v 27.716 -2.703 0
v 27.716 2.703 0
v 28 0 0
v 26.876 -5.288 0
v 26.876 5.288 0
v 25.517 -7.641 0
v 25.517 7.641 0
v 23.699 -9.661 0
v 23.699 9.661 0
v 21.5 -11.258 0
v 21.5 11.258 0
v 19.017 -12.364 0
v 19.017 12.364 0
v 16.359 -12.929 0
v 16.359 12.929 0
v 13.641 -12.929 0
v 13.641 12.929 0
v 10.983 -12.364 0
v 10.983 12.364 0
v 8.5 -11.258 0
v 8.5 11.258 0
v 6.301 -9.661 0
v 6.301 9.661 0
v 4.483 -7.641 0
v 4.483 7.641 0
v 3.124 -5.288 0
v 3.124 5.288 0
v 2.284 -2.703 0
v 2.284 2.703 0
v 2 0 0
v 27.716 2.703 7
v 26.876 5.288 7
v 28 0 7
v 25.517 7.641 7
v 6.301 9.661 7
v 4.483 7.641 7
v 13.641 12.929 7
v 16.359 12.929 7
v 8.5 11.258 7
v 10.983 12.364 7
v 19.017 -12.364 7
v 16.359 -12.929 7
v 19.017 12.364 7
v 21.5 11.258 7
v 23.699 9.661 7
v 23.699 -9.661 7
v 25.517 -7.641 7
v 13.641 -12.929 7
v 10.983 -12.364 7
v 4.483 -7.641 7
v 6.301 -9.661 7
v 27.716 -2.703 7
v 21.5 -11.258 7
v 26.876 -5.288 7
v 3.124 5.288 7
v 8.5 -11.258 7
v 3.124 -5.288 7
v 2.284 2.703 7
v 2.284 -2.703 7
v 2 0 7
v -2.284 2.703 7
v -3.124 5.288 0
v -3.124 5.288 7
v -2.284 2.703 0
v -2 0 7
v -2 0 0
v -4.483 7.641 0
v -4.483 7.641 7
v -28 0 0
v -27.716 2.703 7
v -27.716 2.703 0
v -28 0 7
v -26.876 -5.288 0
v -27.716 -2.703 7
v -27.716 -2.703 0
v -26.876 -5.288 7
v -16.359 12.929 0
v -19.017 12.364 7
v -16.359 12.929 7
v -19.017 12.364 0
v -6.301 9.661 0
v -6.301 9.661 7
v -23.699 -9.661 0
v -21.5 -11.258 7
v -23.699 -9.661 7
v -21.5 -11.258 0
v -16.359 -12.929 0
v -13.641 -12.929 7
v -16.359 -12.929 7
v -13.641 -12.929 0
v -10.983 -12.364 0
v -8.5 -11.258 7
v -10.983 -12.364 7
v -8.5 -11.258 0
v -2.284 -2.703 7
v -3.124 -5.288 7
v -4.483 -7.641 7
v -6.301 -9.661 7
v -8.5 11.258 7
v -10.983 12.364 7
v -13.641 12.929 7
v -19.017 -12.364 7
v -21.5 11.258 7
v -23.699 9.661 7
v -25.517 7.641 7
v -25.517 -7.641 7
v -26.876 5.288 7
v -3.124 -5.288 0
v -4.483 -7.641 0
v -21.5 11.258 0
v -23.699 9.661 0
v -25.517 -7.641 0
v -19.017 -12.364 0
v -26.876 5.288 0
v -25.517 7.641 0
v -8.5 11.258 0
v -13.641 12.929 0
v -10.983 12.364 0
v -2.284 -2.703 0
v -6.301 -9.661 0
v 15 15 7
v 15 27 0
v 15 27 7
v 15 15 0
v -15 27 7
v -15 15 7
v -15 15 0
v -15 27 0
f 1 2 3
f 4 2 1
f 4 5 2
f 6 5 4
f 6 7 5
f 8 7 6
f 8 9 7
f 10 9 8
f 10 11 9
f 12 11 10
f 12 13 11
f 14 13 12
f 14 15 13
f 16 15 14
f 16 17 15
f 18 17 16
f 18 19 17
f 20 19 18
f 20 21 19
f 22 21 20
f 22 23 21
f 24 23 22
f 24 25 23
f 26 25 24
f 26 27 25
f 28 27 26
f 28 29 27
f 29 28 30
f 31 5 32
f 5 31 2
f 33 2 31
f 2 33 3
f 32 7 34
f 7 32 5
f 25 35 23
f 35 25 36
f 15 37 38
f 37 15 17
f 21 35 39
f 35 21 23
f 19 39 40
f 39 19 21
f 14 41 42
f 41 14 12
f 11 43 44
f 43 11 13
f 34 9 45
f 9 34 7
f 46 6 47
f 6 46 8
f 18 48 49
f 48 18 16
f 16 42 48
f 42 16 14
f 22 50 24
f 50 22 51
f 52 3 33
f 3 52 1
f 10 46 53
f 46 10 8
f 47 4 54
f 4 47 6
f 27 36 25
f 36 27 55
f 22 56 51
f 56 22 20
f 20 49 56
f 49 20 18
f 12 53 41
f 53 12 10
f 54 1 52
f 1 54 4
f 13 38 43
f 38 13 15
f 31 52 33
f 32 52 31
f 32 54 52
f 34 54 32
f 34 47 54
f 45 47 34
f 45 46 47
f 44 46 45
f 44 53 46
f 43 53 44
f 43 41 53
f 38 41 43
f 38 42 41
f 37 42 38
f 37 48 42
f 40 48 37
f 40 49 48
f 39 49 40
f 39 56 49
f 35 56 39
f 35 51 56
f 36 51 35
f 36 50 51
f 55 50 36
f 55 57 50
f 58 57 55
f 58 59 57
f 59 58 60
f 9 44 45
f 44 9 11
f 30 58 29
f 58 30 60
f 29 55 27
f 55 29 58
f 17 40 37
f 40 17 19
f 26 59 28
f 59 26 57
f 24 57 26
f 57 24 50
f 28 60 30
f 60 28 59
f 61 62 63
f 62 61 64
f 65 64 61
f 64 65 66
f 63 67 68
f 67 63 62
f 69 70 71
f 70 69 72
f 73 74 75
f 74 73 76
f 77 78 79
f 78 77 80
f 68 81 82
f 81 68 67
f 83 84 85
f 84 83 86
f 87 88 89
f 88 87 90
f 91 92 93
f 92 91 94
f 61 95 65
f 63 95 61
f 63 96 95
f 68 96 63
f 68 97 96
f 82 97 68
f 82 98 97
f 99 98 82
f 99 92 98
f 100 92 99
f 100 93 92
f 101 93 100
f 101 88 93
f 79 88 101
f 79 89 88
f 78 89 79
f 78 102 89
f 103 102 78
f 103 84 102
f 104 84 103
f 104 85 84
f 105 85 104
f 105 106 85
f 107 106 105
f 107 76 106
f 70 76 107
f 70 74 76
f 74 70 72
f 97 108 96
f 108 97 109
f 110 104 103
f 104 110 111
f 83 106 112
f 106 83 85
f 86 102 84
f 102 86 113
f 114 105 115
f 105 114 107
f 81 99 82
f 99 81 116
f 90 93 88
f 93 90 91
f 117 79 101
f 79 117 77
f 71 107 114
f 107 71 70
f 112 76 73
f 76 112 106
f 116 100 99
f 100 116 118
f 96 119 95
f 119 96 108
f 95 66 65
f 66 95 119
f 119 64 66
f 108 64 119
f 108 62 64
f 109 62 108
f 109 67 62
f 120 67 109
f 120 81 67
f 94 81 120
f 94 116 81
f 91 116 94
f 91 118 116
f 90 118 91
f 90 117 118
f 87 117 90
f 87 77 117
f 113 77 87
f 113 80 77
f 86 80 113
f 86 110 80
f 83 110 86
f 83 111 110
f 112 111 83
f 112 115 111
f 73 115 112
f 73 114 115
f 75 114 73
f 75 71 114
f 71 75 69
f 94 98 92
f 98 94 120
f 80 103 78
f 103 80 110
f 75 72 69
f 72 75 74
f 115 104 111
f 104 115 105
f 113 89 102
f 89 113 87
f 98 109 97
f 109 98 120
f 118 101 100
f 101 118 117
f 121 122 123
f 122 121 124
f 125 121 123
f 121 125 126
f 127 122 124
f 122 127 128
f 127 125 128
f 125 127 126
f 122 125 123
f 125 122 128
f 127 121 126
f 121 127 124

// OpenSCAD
translate([15,0,0]) cylinder(d=26, h=7);
translate([-15,0,0]) cylinder(d=26, h=7);
translate([-15, 15, 0]) cube([30, 12, 7]);
